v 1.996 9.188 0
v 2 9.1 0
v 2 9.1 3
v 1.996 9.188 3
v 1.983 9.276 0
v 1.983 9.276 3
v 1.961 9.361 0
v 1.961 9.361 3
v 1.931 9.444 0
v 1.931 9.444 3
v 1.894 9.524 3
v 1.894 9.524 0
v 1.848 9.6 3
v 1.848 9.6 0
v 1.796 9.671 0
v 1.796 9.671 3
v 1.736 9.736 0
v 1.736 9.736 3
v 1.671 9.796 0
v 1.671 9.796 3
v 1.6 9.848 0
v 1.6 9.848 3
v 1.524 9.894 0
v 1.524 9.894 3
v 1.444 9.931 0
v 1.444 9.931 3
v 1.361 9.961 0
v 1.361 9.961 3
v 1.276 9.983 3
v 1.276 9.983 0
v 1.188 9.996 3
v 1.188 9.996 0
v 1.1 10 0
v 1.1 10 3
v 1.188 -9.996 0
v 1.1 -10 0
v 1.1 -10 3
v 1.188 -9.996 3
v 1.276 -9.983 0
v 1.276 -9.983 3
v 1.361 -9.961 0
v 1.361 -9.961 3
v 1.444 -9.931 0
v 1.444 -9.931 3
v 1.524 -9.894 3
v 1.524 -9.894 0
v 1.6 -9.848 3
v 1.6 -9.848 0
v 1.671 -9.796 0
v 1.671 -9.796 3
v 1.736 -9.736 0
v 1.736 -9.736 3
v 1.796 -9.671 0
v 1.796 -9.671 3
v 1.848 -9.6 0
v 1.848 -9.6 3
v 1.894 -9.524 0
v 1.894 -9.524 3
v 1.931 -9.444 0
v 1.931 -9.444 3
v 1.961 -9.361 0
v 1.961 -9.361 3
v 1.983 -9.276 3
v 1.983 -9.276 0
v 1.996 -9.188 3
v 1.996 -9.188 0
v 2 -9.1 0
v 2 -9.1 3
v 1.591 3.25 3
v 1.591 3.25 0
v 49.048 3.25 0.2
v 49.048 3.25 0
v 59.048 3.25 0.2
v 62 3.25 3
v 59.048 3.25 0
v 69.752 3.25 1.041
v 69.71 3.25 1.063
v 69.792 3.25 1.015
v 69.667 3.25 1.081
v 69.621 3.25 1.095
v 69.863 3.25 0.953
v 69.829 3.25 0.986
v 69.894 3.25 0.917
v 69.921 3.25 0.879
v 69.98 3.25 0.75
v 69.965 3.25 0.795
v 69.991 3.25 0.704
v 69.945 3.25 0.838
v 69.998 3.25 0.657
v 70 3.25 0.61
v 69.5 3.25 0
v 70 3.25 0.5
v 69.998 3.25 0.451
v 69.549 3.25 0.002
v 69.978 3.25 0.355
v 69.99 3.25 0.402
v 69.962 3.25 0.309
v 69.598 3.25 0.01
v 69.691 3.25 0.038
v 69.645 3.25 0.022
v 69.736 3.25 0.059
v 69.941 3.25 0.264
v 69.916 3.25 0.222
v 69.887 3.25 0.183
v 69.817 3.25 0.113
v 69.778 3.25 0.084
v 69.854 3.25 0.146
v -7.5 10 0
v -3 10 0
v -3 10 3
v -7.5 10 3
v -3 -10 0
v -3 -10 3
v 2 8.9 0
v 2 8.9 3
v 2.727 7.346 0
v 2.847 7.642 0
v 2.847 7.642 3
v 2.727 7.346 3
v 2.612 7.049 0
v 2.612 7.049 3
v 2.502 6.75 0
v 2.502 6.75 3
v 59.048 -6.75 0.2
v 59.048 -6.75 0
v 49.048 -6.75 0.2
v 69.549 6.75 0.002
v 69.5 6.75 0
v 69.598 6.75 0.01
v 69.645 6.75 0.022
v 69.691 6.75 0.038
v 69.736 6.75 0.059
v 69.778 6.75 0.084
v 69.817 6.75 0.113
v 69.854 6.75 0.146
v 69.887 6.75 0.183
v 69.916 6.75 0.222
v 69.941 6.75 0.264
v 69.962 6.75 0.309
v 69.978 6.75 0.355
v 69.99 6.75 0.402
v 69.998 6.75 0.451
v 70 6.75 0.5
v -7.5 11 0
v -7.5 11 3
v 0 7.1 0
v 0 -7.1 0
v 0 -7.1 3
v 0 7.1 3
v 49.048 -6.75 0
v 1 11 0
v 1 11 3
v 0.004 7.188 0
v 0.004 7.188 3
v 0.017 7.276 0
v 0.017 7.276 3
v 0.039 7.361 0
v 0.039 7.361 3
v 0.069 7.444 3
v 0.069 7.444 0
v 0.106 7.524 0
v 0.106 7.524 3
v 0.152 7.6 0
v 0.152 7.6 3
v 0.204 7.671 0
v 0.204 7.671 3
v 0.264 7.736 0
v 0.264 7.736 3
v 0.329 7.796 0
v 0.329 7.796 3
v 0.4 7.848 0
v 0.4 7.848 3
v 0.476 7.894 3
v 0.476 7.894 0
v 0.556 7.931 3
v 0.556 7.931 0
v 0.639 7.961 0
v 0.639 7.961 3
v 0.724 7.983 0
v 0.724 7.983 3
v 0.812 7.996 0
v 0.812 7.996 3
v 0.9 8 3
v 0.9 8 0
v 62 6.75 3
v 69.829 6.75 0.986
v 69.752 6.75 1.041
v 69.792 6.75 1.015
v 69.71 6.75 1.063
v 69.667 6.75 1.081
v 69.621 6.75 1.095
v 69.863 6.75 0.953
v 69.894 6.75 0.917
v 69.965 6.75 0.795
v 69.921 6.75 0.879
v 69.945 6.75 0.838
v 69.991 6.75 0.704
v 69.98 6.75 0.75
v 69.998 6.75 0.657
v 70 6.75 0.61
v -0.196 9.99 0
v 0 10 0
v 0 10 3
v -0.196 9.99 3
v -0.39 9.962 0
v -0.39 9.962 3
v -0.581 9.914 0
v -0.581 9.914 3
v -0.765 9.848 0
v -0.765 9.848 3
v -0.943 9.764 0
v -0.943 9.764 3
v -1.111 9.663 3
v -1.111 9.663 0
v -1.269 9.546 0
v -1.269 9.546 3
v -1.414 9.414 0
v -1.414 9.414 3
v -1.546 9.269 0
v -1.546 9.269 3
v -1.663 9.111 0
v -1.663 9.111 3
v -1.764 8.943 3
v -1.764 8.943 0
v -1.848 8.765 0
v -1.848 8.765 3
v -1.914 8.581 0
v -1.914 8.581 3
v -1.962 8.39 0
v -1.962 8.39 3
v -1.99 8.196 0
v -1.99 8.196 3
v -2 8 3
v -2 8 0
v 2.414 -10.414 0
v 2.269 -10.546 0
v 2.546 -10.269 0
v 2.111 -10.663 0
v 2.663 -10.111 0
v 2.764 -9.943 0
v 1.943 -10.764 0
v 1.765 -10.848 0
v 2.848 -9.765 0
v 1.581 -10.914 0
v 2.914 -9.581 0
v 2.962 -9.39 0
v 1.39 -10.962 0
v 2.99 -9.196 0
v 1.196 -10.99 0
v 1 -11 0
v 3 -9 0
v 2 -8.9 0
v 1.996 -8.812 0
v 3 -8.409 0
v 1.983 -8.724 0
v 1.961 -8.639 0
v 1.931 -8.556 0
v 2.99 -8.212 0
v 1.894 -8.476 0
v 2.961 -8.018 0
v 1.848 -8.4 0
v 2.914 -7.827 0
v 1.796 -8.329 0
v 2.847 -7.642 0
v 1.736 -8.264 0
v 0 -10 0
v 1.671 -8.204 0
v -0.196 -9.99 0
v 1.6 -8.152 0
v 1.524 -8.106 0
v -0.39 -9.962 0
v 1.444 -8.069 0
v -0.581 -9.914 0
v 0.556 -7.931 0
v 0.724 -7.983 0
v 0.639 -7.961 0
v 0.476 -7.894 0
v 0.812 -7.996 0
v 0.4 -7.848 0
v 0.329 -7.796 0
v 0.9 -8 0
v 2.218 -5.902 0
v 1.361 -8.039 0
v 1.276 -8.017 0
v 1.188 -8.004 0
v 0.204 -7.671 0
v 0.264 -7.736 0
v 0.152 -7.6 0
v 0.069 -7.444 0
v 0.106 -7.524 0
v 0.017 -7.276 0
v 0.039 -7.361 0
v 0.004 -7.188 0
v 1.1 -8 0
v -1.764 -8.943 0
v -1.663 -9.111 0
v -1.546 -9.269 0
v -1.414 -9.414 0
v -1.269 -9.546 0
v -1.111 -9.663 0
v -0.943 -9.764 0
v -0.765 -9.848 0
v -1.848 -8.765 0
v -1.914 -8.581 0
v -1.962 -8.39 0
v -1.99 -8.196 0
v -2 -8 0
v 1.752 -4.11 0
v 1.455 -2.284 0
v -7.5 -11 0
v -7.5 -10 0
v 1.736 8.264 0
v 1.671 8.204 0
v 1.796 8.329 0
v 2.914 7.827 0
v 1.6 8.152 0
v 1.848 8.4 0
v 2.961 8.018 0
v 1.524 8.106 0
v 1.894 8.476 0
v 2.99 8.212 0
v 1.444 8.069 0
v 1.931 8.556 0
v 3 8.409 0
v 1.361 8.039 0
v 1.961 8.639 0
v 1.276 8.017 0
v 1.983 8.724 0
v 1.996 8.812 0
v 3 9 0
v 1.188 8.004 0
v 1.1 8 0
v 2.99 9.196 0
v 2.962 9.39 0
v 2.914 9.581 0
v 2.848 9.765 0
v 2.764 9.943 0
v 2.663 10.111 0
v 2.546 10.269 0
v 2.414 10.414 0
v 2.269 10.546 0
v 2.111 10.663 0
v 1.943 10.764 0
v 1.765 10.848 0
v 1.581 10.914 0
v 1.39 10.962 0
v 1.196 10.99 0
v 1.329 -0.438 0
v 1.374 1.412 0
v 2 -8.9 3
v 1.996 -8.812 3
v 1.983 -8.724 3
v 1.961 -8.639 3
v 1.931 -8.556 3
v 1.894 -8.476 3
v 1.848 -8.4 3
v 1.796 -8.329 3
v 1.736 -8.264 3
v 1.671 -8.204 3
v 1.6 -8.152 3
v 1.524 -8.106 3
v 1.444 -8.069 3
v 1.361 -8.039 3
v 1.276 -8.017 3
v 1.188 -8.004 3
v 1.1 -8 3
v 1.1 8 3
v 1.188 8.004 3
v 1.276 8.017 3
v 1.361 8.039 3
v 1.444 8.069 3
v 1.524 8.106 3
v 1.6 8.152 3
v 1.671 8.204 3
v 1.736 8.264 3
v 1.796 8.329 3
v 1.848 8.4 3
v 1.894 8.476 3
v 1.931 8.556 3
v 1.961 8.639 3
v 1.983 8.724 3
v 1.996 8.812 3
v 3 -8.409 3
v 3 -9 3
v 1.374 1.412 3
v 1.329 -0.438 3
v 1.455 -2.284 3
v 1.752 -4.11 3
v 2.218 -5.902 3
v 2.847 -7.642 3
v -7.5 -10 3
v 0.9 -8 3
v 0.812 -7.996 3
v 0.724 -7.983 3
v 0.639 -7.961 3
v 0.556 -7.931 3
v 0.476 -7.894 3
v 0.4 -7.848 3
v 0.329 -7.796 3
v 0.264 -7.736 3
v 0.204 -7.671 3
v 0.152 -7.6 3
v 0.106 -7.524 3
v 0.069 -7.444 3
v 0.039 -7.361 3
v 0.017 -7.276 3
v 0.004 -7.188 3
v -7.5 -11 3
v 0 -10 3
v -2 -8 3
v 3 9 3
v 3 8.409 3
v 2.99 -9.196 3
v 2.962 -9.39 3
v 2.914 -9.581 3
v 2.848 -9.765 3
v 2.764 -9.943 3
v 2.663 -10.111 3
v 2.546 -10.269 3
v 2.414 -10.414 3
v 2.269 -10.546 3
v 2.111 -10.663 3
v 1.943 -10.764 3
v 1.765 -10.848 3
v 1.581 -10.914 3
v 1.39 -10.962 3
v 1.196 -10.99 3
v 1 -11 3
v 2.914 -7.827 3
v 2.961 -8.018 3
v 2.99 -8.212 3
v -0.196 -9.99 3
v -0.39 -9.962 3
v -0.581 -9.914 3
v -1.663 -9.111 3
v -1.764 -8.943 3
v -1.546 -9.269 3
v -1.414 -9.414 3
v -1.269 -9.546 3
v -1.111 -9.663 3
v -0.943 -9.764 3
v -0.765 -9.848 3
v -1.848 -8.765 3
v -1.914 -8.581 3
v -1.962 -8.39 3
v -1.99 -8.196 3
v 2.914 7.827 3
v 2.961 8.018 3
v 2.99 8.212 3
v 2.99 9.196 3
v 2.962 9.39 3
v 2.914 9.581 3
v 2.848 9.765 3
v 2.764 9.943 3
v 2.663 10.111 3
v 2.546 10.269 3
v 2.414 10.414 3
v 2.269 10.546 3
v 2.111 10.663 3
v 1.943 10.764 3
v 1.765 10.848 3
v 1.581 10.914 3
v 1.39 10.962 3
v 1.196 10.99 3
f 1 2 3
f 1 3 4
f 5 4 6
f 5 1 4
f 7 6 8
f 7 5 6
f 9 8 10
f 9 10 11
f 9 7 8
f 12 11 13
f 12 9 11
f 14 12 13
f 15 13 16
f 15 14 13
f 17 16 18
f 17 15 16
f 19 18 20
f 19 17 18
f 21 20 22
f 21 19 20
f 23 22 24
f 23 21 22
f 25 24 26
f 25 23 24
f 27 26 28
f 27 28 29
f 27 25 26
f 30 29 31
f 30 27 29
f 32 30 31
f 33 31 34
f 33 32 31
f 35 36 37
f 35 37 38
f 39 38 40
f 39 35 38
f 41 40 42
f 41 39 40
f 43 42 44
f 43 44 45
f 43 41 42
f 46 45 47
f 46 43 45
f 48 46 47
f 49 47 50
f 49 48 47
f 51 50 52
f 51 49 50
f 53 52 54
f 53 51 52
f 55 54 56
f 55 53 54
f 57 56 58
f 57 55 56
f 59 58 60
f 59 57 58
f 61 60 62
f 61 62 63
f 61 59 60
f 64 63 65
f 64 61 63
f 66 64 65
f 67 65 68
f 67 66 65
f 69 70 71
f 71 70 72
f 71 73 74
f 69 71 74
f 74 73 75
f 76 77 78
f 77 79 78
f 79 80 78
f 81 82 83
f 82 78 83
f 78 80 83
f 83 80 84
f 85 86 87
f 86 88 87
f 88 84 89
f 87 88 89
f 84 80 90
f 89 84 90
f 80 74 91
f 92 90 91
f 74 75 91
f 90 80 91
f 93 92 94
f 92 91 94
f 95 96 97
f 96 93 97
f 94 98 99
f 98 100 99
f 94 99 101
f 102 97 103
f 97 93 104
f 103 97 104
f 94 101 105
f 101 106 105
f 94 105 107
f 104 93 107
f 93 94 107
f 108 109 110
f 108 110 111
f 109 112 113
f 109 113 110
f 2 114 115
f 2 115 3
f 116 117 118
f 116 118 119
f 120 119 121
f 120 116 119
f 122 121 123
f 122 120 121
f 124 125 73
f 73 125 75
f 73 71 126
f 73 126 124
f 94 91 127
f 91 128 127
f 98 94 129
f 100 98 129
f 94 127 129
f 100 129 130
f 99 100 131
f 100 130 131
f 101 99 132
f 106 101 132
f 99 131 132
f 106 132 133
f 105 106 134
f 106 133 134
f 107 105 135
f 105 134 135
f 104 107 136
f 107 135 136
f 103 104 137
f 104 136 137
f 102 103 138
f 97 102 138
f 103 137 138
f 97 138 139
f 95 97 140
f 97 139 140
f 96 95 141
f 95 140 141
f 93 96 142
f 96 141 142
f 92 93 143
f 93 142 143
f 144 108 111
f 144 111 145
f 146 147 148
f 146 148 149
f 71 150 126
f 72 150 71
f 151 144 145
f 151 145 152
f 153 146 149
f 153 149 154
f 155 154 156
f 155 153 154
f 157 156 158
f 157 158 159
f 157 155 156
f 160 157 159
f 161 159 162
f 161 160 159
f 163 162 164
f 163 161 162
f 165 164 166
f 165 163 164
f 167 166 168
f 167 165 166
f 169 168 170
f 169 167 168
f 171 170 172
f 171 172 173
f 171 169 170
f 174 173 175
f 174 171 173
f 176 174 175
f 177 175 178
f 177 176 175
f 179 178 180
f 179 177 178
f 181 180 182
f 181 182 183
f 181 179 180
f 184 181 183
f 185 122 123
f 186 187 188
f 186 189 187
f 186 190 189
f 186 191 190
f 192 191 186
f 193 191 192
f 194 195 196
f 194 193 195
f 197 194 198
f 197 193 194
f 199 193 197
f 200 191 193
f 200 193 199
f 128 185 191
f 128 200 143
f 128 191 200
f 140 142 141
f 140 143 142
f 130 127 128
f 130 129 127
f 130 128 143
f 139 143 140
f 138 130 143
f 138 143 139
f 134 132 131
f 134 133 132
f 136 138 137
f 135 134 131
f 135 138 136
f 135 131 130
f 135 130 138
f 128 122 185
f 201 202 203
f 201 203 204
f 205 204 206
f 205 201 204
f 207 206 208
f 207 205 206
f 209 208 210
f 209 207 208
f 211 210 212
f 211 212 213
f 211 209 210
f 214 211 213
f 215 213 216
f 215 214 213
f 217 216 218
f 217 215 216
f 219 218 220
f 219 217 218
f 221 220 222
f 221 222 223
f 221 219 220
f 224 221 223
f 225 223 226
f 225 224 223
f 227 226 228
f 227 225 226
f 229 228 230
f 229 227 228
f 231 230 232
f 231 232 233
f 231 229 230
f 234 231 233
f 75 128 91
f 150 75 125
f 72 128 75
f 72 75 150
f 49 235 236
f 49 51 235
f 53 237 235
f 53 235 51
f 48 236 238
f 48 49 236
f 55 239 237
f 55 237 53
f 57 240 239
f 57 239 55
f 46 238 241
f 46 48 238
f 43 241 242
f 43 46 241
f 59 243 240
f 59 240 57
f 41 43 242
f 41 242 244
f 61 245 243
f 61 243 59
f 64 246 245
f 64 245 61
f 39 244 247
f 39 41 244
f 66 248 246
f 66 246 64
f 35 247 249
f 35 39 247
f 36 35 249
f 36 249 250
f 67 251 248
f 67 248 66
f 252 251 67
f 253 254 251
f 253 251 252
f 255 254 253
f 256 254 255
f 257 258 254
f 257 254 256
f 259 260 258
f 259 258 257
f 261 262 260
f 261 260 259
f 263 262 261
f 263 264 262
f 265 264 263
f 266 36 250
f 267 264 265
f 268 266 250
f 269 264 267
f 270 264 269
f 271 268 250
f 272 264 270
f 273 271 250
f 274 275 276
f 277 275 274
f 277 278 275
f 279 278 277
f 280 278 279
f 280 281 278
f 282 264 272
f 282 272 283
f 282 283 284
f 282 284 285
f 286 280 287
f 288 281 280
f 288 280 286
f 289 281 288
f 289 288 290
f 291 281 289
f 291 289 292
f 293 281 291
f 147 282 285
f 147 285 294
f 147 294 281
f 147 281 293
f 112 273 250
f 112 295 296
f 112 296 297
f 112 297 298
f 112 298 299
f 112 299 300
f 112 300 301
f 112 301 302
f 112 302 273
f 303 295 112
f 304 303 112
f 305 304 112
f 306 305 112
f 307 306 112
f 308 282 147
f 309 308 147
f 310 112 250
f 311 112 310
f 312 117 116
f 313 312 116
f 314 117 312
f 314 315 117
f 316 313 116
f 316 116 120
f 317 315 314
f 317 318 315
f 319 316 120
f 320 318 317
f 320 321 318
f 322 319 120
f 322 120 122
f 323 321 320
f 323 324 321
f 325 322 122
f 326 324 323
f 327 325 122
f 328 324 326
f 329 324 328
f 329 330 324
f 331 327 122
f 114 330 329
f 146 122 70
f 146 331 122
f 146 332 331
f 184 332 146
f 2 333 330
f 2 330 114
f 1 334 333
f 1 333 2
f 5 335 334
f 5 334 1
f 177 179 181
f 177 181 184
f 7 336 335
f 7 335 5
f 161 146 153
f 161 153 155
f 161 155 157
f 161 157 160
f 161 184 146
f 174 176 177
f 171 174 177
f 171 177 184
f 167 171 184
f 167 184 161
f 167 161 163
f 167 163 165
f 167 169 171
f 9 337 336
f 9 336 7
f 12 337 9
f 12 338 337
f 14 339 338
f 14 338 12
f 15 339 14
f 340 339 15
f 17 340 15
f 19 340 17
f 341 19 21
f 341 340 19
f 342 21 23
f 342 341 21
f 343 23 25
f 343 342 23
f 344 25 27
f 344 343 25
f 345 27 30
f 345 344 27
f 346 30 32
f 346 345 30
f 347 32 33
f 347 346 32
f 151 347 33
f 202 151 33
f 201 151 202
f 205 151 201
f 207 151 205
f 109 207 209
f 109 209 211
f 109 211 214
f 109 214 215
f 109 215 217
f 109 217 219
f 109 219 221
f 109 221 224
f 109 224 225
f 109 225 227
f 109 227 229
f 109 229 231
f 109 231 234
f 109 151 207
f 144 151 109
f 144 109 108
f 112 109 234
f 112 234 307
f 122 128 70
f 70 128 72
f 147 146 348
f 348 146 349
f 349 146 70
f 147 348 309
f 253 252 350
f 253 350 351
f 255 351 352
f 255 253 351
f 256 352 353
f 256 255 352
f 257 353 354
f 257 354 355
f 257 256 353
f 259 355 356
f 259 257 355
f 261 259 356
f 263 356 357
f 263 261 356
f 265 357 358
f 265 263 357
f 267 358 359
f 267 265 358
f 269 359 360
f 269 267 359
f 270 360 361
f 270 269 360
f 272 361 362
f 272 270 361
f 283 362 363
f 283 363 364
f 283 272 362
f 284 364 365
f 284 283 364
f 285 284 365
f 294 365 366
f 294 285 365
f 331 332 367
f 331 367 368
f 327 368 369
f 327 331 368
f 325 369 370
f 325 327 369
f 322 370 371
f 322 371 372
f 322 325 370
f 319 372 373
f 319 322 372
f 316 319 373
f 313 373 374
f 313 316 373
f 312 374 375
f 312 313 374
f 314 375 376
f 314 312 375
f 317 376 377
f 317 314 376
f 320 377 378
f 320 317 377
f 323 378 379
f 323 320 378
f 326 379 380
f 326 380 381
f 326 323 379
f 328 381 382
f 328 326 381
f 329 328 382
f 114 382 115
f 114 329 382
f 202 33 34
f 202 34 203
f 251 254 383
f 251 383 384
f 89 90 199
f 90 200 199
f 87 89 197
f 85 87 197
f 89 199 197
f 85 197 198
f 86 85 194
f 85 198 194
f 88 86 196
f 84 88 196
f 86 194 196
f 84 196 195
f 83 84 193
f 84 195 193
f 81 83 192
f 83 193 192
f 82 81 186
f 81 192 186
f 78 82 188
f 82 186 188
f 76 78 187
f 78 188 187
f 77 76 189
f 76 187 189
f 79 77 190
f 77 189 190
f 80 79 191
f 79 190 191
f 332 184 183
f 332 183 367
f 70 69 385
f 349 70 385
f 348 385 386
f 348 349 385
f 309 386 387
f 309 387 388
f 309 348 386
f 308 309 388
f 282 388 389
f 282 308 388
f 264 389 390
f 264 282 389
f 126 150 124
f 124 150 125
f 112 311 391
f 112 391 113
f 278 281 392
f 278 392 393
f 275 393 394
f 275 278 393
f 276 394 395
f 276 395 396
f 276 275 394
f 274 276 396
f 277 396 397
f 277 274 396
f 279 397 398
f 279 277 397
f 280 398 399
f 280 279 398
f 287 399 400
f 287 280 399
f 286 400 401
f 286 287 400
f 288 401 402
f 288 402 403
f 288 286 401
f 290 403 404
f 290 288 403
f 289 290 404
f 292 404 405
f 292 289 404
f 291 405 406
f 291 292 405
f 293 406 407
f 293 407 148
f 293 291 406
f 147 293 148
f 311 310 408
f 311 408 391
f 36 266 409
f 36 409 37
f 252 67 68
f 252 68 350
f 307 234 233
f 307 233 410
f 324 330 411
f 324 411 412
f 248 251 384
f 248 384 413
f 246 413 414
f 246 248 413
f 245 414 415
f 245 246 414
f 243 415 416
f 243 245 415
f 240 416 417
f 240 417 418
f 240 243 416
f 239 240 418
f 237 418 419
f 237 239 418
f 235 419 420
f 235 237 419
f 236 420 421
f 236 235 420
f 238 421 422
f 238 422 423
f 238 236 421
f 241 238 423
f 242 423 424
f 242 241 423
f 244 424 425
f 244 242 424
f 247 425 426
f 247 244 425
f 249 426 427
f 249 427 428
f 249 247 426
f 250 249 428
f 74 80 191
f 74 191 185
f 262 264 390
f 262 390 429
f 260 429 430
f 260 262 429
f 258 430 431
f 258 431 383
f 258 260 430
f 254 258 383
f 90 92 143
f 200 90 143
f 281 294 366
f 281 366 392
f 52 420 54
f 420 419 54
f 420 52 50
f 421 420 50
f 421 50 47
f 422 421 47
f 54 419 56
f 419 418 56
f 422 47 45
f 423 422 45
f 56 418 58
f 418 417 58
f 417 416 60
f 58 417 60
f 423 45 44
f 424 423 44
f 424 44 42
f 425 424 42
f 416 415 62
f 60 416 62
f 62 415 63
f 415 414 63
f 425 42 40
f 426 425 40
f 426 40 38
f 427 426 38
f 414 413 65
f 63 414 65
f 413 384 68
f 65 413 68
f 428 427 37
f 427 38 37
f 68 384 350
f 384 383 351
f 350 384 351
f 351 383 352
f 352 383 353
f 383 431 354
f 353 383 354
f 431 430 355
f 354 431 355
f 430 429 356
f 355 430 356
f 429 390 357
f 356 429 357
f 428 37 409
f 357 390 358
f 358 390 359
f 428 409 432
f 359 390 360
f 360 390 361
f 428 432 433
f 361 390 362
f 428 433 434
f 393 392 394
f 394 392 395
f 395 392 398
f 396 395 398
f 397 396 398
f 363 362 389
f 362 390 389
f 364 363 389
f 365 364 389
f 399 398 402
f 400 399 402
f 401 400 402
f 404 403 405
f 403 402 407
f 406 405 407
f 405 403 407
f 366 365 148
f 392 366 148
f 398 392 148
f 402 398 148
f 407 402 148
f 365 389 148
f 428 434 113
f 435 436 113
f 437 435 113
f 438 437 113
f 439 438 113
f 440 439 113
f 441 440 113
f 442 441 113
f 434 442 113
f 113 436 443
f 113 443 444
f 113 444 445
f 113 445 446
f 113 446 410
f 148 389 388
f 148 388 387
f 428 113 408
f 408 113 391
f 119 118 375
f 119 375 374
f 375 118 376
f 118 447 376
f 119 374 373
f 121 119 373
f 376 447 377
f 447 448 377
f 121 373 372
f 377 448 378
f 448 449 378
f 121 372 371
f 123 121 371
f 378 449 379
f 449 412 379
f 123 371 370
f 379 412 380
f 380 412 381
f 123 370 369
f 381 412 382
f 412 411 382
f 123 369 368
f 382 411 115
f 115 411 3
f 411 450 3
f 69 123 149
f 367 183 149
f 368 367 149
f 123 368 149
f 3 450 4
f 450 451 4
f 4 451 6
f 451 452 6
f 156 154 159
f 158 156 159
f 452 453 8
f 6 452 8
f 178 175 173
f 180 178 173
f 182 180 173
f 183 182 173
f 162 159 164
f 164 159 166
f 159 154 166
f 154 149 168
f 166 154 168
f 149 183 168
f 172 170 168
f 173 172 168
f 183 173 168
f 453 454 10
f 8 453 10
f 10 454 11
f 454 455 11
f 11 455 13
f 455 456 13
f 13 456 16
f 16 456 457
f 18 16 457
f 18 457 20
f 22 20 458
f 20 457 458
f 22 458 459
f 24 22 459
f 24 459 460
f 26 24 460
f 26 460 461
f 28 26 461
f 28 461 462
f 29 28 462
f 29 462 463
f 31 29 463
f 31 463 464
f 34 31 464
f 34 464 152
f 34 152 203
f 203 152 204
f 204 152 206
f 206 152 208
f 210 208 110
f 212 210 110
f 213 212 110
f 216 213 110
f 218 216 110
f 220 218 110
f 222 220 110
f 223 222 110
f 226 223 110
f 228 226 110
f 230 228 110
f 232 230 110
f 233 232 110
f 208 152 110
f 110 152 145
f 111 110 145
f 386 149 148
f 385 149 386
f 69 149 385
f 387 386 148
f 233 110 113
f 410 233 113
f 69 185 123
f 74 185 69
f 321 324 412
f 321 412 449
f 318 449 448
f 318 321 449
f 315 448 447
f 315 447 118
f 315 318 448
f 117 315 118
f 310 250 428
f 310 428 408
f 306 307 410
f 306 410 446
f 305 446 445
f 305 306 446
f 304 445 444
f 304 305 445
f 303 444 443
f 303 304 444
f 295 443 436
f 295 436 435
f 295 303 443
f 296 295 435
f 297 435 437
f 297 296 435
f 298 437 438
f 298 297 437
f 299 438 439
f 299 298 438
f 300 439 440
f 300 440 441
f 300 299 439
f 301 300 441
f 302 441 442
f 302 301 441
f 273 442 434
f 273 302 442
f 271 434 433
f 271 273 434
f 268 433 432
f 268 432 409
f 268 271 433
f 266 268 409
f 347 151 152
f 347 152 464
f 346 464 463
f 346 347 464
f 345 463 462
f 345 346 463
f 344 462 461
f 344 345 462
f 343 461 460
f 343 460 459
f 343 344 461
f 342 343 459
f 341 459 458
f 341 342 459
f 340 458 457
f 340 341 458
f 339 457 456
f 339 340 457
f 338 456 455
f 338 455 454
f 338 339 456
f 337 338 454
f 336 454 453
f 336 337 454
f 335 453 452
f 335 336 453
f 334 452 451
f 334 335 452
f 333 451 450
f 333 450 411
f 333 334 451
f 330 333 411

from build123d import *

# Parameters (mm, degrees)
HOOK_DEPTH          = 3
SKETCH2_W           = 70
SKETCH2_H           = 3.5
PIN_DEPTH           = 3
CUT_EXTRUDE1_DEPTH  = 3.5
FILLET1_R           = 0.5
SKETCH4_W           = 10
SKETCH4_H           = 10
BOSS_EXTRUDE3_DEPTH = 0.2


with BuildPart() as part:
    # Sketch1 → Hook (new body)
    with BuildSketch(Plane.XY):
        with BuildLine():
            Line((1, -11), (-3, -11))
            Line((-3, -11), (-7.5, -11))
            Line((-7.5, -11), (-7.5, -10))
            Line((-7.5, -10), (-3, -10))
            Line((-3, -10), (-3, 10))
            Line((-3, 10), (-7.5, 10))
            Line((-7.5, 10), (-7.5, 11))
            Line((-7.5, 11), (-3, 11))
            Line((-3, 11), (1, 11))
            ThreePointArc((1, 11), (2.414213562, 10.414213562), (3, 9))
            Line((3, 9), (3, 8.408634703))
            ThreePointArc((3, 8.408634703), (2.961405113, 8.017623214), (2.847110016, 7.64170277))
            ThreePointArc((2.847110016, 7.64170277), (1.32371561, 0), (2.847110016, -7.64170277))
            ThreePointArc((2.847110016, -7.64170277), (2.961405113, -8.017623214), (3, -8.408634703))
            Line((3, -8.408634703), (3, -9))
            ThreePointArc((3, -9), (2.414213562, -10.414213562), (1, -11))
        make_face()
        with BuildLine():
            Line((2, 8.9), (2, 9.1))
            ThreePointArc((2, 9.1), (1.736396103, 9.736396103), (1.1, 10))
            Line((1.1, 10), (0, 10))
            ThreePointArc((0, 10), (-1.414213562, 9.414213562), (-2, 8))
            Line((-2, 8), (-2, -8))
            ThreePointArc((-2, -8), (-1.414213562, -9.414213562), (0, -10))
            Line((0, -10), (1.1, -10))
            ThreePointArc((1.1, -10), (1.736396103, -9.736396103), (2, -9.1))
            Line((2, -9.1), (2, -8.9))
            ThreePointArc((2, -8.9), (1.736396103, -8.263603897), (1.1, -8))
            Line((1.1, -8), (0.9, -8))
            ThreePointArc((0.9, -8), (0.263603897, -7.736396103), (0, -7.1))
            Line((0, -7.1), (0, 7.1))
            ThreePointArc((0, 7.1), (0.263603897, 7.736396103), (0.9, 8))
            Line((0.9, 8), (1.1, 8))
            ThreePointArc((1.1, 8), (1.736396103, 8.263603897), (2, 8.9))
        make_face(mode=Mode.SUBTRACT)
    extrude(amount=HOOK_DEPTH)

    # Sketch2 → Pin (add)
    with BuildSketch(Plane.XY):
        with Locations((35, 5)):
            Rectangle(SKETCH2_W, SKETCH2_H)
    extrude(amount=PIN_DEPTH)

    # Sketch3 → Cut-Extrude1 (cut)
    with BuildSketch(Plane.XZ.offset(-3.25)):
        Polygon((62, 3), (70, 3), (70, 1), align=None)
    extrude(amount=-CUT_EXTRUDE1_DEPTH, mode=Mode.SUBTRACT)

    # Fillet1
    fillet1_edges = [part.edges().sort_by_distance(p)[0] for p in [
        (70, 5, 0),
        (70, 5, 1),
    ]]
    fillet(fillet1_edges, radius=FILLET1_R)

    # Sketch4 → Boss-Extrude3 (add)
    with BuildSketch(Plane.XY):
        with Locations((54.047822984, -1.75)):
            Rectangle(SKETCH4_W, SKETCH4_H)
    extrude(amount=BOSS_EXTRUDE3_DEPTH)


solid = part.part
